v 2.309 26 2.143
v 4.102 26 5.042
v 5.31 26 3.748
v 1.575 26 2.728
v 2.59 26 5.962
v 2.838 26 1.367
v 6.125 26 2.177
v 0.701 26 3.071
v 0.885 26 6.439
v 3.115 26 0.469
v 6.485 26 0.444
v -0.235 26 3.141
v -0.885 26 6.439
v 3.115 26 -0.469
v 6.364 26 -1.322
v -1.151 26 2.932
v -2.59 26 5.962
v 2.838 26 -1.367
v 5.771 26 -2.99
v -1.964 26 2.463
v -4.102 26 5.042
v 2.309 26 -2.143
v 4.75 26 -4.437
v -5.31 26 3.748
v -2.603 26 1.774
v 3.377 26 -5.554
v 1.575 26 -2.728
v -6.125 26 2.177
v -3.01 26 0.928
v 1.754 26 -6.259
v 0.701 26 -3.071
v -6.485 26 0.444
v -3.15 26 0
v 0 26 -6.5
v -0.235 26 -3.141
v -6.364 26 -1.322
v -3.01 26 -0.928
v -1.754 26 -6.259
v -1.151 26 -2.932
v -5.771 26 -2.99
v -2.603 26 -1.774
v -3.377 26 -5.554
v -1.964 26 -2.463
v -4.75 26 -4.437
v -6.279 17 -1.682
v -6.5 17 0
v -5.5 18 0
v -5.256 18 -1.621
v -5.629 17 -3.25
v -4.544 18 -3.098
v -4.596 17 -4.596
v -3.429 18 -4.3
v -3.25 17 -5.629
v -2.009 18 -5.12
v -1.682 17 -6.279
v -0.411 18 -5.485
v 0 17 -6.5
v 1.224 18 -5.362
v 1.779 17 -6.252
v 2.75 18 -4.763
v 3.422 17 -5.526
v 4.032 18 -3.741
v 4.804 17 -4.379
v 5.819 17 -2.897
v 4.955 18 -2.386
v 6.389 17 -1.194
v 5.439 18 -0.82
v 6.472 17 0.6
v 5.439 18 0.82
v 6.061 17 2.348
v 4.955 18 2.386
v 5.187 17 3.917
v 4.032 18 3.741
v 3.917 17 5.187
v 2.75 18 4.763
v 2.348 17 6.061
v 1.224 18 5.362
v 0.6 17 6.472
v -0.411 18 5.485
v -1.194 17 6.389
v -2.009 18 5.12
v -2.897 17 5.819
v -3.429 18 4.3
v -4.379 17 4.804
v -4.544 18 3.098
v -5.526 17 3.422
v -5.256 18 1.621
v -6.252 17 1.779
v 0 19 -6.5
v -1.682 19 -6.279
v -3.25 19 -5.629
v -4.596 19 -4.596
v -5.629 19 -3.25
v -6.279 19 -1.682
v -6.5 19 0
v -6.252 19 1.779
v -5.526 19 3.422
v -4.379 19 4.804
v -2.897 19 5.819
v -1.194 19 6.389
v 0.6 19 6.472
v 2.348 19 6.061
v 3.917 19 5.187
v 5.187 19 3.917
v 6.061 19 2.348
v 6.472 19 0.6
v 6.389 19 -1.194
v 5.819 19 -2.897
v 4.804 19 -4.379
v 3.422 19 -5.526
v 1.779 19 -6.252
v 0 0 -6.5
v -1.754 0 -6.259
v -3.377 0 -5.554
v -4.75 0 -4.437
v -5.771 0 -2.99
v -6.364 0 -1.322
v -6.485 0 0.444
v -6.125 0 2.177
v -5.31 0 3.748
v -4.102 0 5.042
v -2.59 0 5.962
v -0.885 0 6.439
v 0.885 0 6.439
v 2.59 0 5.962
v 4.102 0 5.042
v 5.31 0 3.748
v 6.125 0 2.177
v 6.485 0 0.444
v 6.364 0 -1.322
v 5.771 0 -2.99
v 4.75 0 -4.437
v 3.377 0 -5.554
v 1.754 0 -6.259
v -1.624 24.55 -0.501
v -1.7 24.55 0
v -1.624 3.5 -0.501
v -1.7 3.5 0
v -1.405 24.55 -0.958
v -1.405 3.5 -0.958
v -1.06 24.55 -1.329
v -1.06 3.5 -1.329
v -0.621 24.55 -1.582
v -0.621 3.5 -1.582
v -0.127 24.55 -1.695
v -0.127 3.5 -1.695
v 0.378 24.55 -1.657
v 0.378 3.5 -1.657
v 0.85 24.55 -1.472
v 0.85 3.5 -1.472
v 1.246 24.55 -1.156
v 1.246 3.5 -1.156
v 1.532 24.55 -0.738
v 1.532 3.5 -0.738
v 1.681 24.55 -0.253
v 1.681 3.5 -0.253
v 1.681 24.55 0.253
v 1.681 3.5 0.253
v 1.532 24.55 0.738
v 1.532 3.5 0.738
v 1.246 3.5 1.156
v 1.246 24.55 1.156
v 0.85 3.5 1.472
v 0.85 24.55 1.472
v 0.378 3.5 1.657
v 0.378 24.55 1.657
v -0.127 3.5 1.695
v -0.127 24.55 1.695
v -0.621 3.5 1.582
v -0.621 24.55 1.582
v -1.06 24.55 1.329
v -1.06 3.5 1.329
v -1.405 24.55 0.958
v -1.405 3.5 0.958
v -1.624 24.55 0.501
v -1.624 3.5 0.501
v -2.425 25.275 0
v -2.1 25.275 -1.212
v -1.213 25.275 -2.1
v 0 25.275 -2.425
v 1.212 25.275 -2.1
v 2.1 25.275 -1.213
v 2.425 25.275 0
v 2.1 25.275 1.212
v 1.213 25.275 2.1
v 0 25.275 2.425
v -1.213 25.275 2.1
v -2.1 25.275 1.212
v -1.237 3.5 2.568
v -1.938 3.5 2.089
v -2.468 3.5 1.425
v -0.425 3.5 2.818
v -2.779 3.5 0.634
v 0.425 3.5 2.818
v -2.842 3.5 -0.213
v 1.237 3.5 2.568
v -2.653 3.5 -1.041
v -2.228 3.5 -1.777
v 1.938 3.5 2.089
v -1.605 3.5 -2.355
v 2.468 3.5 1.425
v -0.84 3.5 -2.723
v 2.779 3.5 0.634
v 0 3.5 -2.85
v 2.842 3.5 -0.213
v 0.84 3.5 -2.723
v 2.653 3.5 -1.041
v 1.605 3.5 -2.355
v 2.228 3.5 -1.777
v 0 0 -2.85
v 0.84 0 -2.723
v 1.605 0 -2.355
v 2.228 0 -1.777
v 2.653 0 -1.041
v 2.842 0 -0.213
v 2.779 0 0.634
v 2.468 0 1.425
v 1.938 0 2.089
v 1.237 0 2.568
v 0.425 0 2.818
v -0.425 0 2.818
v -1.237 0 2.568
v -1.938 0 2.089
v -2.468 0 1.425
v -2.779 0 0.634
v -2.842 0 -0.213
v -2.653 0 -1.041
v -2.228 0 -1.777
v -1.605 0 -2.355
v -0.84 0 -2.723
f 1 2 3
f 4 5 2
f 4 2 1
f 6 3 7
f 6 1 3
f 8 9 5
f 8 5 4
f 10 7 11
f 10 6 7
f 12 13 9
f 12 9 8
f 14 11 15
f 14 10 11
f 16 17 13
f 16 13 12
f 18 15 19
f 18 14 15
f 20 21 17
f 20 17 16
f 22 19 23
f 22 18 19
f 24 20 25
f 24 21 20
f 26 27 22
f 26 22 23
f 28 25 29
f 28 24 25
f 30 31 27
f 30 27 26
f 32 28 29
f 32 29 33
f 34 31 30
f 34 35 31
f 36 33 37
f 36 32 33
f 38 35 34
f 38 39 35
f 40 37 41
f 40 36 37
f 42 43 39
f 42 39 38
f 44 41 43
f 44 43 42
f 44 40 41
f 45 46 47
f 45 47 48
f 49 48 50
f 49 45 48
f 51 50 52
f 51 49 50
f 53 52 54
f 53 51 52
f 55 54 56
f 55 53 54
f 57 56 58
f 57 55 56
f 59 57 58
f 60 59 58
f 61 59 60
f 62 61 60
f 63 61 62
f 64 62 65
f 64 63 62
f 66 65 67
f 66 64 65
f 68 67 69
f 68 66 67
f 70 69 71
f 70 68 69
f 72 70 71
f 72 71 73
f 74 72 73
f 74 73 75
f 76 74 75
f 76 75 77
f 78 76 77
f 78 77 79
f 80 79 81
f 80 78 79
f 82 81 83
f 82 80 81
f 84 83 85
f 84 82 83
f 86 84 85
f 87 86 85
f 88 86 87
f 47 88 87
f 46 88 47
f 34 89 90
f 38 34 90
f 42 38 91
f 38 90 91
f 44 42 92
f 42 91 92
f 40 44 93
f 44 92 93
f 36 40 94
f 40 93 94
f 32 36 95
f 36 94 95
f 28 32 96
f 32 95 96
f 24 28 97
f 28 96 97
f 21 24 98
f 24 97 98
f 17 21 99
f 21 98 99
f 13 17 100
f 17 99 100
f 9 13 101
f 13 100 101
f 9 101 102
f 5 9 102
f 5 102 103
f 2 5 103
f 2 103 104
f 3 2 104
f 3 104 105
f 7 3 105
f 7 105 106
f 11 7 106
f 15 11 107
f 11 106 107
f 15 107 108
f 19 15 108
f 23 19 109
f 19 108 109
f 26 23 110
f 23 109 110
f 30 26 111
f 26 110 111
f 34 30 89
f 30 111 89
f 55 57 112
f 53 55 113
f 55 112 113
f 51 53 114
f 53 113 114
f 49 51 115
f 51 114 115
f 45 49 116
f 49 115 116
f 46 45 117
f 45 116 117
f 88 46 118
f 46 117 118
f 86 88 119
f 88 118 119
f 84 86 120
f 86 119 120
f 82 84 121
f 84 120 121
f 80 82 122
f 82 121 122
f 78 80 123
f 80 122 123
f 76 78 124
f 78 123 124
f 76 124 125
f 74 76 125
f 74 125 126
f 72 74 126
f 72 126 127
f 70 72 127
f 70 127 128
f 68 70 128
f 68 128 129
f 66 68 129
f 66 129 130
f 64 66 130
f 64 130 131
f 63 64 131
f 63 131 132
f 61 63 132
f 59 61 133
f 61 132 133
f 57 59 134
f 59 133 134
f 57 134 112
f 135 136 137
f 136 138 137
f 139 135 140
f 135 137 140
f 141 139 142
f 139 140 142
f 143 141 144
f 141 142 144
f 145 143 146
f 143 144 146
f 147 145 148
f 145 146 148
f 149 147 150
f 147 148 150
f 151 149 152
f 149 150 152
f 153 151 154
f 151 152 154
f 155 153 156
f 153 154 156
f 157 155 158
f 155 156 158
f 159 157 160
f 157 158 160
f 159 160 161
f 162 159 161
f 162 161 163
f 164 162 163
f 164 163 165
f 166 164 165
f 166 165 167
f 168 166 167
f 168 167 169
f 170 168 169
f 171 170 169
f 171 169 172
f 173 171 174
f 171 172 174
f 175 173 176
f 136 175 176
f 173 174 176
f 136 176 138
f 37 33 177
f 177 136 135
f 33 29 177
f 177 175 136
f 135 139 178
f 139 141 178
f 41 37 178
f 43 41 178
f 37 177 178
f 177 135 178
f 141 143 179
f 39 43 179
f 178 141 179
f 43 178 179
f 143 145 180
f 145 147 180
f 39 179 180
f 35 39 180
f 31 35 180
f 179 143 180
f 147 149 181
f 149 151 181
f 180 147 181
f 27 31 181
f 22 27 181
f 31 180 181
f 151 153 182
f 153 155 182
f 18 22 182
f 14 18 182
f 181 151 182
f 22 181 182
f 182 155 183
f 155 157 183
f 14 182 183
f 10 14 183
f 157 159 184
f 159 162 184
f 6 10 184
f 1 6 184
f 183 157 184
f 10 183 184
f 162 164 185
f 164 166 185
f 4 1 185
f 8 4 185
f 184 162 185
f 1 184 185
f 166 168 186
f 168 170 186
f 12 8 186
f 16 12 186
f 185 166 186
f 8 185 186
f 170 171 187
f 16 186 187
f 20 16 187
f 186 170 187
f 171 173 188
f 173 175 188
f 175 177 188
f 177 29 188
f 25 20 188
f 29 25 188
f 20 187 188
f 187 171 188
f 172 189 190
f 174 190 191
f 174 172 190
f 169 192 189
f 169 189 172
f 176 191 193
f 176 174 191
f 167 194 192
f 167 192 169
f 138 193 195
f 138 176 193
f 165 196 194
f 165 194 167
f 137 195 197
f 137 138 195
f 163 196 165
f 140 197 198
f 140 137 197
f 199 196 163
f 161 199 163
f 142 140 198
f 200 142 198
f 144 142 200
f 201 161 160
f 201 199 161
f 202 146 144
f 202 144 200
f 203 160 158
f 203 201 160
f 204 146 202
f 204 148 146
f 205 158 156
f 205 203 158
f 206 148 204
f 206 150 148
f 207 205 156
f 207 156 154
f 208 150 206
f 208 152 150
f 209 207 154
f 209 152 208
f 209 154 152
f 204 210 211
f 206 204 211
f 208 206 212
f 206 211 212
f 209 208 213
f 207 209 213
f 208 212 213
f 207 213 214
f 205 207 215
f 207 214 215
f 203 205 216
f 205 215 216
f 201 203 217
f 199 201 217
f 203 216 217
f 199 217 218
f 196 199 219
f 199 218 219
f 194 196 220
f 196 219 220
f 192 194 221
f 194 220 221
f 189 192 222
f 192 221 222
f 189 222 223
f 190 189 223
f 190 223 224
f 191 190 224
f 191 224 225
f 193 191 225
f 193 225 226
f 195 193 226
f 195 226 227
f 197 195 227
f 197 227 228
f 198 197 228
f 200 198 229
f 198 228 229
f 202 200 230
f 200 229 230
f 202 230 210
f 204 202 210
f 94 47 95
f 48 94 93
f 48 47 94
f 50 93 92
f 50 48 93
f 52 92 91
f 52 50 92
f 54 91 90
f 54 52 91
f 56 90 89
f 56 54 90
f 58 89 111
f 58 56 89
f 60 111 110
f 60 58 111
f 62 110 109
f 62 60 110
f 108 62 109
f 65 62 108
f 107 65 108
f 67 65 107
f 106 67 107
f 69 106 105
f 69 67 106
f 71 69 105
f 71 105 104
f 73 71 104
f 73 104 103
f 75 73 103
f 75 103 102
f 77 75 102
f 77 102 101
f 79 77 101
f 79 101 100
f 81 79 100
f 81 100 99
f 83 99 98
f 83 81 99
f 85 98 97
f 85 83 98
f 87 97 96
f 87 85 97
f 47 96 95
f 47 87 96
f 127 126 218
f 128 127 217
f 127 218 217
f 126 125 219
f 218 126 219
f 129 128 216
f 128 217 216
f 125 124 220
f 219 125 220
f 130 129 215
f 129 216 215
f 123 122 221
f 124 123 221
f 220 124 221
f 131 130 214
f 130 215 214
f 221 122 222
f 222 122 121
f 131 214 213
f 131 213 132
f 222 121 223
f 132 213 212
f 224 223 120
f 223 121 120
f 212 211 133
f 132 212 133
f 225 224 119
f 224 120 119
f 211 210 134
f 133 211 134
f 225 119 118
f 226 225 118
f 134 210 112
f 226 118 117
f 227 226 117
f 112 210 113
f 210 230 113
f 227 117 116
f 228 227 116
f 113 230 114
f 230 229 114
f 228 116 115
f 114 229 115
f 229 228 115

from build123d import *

# Parameters (mm, degrees)
SKETCH_1_R                  = 6.5
EXTRUDE_1_DEPTH             = 26
SKETCH_2_R                  = 2.85
CUT_EXTRUDE_1_DEPTH         = 3.5
HOLE_WIZARD_M32_D           = 3.4
HOLE_WIZARD_M32_CSINK_D     = 6.3
HOLE_WIZARD_M32_CSINK_ANGLE = 90


with BuildPart() as part:
    # Эскиз1 → Бобышка-Вытянуть1 (new body)
    with BuildSketch(Plane(origin=(0, 0, 0), x_dir=(1, 0, 0), z_dir=(0, 1, 0))):
        with Locations(Location((0, 0, 0), (0, 0, 90))):
            Circle(SKETCH_1_R)
    extrude(amount=EXTRUDE_1_DEPTH)

    # Эскиз2 → Вырез-Вытянуть1 (cut)
    with BuildSketch(Plane.XZ):
        with Locations(Location((0, 0, 0), (0, 0, 270))):
            Circle(SKETCH_2_R)
    extrude(amount=-CUT_EXTRUDE_1_DEPTH, mode=Mode.SUBTRACT)

    # Зенковка для  винта с плоской головкой M32 (through all)
    with Locations(Plane(origin=(0, 26, 0), x_dir=(1, 0, 0), z_dir=(0, 1, 0))):
        with Locations((0, 0)):
            CounterSinkHole(HOLE_WIZARD_M32_D / 2, HOLE_WIZARD_M32_CSINK_D / 2, counter_sink_angle=HOLE_WIZARD_M32_CSINK_ANGLE)

    # Вырез-По траектории2: sweep along a path in Эскиз5
    with BuildLine(Plane(origin=(0, 18, 0), x_dir=(-1, 0, 0), z_dir=(0, -1, 0))) as sweep_2_path:
        CenterArc((0, 0), 6.5, 0, 360)
    # Эскиз6 → Вырез-По траектории2 (sweep, cut)
    with BuildSketch(Plane(origin=(0, 0, 0), x_dir=(0, 0, -1), z_dir=(1, 0, 0))):
        Polygon((6.5, 19), (5.5, 18), (6.5, 17), align=None)
    sweep(path=sweep_2_path.line, mode=Mode.SUBTRACT)


solid = part.part
